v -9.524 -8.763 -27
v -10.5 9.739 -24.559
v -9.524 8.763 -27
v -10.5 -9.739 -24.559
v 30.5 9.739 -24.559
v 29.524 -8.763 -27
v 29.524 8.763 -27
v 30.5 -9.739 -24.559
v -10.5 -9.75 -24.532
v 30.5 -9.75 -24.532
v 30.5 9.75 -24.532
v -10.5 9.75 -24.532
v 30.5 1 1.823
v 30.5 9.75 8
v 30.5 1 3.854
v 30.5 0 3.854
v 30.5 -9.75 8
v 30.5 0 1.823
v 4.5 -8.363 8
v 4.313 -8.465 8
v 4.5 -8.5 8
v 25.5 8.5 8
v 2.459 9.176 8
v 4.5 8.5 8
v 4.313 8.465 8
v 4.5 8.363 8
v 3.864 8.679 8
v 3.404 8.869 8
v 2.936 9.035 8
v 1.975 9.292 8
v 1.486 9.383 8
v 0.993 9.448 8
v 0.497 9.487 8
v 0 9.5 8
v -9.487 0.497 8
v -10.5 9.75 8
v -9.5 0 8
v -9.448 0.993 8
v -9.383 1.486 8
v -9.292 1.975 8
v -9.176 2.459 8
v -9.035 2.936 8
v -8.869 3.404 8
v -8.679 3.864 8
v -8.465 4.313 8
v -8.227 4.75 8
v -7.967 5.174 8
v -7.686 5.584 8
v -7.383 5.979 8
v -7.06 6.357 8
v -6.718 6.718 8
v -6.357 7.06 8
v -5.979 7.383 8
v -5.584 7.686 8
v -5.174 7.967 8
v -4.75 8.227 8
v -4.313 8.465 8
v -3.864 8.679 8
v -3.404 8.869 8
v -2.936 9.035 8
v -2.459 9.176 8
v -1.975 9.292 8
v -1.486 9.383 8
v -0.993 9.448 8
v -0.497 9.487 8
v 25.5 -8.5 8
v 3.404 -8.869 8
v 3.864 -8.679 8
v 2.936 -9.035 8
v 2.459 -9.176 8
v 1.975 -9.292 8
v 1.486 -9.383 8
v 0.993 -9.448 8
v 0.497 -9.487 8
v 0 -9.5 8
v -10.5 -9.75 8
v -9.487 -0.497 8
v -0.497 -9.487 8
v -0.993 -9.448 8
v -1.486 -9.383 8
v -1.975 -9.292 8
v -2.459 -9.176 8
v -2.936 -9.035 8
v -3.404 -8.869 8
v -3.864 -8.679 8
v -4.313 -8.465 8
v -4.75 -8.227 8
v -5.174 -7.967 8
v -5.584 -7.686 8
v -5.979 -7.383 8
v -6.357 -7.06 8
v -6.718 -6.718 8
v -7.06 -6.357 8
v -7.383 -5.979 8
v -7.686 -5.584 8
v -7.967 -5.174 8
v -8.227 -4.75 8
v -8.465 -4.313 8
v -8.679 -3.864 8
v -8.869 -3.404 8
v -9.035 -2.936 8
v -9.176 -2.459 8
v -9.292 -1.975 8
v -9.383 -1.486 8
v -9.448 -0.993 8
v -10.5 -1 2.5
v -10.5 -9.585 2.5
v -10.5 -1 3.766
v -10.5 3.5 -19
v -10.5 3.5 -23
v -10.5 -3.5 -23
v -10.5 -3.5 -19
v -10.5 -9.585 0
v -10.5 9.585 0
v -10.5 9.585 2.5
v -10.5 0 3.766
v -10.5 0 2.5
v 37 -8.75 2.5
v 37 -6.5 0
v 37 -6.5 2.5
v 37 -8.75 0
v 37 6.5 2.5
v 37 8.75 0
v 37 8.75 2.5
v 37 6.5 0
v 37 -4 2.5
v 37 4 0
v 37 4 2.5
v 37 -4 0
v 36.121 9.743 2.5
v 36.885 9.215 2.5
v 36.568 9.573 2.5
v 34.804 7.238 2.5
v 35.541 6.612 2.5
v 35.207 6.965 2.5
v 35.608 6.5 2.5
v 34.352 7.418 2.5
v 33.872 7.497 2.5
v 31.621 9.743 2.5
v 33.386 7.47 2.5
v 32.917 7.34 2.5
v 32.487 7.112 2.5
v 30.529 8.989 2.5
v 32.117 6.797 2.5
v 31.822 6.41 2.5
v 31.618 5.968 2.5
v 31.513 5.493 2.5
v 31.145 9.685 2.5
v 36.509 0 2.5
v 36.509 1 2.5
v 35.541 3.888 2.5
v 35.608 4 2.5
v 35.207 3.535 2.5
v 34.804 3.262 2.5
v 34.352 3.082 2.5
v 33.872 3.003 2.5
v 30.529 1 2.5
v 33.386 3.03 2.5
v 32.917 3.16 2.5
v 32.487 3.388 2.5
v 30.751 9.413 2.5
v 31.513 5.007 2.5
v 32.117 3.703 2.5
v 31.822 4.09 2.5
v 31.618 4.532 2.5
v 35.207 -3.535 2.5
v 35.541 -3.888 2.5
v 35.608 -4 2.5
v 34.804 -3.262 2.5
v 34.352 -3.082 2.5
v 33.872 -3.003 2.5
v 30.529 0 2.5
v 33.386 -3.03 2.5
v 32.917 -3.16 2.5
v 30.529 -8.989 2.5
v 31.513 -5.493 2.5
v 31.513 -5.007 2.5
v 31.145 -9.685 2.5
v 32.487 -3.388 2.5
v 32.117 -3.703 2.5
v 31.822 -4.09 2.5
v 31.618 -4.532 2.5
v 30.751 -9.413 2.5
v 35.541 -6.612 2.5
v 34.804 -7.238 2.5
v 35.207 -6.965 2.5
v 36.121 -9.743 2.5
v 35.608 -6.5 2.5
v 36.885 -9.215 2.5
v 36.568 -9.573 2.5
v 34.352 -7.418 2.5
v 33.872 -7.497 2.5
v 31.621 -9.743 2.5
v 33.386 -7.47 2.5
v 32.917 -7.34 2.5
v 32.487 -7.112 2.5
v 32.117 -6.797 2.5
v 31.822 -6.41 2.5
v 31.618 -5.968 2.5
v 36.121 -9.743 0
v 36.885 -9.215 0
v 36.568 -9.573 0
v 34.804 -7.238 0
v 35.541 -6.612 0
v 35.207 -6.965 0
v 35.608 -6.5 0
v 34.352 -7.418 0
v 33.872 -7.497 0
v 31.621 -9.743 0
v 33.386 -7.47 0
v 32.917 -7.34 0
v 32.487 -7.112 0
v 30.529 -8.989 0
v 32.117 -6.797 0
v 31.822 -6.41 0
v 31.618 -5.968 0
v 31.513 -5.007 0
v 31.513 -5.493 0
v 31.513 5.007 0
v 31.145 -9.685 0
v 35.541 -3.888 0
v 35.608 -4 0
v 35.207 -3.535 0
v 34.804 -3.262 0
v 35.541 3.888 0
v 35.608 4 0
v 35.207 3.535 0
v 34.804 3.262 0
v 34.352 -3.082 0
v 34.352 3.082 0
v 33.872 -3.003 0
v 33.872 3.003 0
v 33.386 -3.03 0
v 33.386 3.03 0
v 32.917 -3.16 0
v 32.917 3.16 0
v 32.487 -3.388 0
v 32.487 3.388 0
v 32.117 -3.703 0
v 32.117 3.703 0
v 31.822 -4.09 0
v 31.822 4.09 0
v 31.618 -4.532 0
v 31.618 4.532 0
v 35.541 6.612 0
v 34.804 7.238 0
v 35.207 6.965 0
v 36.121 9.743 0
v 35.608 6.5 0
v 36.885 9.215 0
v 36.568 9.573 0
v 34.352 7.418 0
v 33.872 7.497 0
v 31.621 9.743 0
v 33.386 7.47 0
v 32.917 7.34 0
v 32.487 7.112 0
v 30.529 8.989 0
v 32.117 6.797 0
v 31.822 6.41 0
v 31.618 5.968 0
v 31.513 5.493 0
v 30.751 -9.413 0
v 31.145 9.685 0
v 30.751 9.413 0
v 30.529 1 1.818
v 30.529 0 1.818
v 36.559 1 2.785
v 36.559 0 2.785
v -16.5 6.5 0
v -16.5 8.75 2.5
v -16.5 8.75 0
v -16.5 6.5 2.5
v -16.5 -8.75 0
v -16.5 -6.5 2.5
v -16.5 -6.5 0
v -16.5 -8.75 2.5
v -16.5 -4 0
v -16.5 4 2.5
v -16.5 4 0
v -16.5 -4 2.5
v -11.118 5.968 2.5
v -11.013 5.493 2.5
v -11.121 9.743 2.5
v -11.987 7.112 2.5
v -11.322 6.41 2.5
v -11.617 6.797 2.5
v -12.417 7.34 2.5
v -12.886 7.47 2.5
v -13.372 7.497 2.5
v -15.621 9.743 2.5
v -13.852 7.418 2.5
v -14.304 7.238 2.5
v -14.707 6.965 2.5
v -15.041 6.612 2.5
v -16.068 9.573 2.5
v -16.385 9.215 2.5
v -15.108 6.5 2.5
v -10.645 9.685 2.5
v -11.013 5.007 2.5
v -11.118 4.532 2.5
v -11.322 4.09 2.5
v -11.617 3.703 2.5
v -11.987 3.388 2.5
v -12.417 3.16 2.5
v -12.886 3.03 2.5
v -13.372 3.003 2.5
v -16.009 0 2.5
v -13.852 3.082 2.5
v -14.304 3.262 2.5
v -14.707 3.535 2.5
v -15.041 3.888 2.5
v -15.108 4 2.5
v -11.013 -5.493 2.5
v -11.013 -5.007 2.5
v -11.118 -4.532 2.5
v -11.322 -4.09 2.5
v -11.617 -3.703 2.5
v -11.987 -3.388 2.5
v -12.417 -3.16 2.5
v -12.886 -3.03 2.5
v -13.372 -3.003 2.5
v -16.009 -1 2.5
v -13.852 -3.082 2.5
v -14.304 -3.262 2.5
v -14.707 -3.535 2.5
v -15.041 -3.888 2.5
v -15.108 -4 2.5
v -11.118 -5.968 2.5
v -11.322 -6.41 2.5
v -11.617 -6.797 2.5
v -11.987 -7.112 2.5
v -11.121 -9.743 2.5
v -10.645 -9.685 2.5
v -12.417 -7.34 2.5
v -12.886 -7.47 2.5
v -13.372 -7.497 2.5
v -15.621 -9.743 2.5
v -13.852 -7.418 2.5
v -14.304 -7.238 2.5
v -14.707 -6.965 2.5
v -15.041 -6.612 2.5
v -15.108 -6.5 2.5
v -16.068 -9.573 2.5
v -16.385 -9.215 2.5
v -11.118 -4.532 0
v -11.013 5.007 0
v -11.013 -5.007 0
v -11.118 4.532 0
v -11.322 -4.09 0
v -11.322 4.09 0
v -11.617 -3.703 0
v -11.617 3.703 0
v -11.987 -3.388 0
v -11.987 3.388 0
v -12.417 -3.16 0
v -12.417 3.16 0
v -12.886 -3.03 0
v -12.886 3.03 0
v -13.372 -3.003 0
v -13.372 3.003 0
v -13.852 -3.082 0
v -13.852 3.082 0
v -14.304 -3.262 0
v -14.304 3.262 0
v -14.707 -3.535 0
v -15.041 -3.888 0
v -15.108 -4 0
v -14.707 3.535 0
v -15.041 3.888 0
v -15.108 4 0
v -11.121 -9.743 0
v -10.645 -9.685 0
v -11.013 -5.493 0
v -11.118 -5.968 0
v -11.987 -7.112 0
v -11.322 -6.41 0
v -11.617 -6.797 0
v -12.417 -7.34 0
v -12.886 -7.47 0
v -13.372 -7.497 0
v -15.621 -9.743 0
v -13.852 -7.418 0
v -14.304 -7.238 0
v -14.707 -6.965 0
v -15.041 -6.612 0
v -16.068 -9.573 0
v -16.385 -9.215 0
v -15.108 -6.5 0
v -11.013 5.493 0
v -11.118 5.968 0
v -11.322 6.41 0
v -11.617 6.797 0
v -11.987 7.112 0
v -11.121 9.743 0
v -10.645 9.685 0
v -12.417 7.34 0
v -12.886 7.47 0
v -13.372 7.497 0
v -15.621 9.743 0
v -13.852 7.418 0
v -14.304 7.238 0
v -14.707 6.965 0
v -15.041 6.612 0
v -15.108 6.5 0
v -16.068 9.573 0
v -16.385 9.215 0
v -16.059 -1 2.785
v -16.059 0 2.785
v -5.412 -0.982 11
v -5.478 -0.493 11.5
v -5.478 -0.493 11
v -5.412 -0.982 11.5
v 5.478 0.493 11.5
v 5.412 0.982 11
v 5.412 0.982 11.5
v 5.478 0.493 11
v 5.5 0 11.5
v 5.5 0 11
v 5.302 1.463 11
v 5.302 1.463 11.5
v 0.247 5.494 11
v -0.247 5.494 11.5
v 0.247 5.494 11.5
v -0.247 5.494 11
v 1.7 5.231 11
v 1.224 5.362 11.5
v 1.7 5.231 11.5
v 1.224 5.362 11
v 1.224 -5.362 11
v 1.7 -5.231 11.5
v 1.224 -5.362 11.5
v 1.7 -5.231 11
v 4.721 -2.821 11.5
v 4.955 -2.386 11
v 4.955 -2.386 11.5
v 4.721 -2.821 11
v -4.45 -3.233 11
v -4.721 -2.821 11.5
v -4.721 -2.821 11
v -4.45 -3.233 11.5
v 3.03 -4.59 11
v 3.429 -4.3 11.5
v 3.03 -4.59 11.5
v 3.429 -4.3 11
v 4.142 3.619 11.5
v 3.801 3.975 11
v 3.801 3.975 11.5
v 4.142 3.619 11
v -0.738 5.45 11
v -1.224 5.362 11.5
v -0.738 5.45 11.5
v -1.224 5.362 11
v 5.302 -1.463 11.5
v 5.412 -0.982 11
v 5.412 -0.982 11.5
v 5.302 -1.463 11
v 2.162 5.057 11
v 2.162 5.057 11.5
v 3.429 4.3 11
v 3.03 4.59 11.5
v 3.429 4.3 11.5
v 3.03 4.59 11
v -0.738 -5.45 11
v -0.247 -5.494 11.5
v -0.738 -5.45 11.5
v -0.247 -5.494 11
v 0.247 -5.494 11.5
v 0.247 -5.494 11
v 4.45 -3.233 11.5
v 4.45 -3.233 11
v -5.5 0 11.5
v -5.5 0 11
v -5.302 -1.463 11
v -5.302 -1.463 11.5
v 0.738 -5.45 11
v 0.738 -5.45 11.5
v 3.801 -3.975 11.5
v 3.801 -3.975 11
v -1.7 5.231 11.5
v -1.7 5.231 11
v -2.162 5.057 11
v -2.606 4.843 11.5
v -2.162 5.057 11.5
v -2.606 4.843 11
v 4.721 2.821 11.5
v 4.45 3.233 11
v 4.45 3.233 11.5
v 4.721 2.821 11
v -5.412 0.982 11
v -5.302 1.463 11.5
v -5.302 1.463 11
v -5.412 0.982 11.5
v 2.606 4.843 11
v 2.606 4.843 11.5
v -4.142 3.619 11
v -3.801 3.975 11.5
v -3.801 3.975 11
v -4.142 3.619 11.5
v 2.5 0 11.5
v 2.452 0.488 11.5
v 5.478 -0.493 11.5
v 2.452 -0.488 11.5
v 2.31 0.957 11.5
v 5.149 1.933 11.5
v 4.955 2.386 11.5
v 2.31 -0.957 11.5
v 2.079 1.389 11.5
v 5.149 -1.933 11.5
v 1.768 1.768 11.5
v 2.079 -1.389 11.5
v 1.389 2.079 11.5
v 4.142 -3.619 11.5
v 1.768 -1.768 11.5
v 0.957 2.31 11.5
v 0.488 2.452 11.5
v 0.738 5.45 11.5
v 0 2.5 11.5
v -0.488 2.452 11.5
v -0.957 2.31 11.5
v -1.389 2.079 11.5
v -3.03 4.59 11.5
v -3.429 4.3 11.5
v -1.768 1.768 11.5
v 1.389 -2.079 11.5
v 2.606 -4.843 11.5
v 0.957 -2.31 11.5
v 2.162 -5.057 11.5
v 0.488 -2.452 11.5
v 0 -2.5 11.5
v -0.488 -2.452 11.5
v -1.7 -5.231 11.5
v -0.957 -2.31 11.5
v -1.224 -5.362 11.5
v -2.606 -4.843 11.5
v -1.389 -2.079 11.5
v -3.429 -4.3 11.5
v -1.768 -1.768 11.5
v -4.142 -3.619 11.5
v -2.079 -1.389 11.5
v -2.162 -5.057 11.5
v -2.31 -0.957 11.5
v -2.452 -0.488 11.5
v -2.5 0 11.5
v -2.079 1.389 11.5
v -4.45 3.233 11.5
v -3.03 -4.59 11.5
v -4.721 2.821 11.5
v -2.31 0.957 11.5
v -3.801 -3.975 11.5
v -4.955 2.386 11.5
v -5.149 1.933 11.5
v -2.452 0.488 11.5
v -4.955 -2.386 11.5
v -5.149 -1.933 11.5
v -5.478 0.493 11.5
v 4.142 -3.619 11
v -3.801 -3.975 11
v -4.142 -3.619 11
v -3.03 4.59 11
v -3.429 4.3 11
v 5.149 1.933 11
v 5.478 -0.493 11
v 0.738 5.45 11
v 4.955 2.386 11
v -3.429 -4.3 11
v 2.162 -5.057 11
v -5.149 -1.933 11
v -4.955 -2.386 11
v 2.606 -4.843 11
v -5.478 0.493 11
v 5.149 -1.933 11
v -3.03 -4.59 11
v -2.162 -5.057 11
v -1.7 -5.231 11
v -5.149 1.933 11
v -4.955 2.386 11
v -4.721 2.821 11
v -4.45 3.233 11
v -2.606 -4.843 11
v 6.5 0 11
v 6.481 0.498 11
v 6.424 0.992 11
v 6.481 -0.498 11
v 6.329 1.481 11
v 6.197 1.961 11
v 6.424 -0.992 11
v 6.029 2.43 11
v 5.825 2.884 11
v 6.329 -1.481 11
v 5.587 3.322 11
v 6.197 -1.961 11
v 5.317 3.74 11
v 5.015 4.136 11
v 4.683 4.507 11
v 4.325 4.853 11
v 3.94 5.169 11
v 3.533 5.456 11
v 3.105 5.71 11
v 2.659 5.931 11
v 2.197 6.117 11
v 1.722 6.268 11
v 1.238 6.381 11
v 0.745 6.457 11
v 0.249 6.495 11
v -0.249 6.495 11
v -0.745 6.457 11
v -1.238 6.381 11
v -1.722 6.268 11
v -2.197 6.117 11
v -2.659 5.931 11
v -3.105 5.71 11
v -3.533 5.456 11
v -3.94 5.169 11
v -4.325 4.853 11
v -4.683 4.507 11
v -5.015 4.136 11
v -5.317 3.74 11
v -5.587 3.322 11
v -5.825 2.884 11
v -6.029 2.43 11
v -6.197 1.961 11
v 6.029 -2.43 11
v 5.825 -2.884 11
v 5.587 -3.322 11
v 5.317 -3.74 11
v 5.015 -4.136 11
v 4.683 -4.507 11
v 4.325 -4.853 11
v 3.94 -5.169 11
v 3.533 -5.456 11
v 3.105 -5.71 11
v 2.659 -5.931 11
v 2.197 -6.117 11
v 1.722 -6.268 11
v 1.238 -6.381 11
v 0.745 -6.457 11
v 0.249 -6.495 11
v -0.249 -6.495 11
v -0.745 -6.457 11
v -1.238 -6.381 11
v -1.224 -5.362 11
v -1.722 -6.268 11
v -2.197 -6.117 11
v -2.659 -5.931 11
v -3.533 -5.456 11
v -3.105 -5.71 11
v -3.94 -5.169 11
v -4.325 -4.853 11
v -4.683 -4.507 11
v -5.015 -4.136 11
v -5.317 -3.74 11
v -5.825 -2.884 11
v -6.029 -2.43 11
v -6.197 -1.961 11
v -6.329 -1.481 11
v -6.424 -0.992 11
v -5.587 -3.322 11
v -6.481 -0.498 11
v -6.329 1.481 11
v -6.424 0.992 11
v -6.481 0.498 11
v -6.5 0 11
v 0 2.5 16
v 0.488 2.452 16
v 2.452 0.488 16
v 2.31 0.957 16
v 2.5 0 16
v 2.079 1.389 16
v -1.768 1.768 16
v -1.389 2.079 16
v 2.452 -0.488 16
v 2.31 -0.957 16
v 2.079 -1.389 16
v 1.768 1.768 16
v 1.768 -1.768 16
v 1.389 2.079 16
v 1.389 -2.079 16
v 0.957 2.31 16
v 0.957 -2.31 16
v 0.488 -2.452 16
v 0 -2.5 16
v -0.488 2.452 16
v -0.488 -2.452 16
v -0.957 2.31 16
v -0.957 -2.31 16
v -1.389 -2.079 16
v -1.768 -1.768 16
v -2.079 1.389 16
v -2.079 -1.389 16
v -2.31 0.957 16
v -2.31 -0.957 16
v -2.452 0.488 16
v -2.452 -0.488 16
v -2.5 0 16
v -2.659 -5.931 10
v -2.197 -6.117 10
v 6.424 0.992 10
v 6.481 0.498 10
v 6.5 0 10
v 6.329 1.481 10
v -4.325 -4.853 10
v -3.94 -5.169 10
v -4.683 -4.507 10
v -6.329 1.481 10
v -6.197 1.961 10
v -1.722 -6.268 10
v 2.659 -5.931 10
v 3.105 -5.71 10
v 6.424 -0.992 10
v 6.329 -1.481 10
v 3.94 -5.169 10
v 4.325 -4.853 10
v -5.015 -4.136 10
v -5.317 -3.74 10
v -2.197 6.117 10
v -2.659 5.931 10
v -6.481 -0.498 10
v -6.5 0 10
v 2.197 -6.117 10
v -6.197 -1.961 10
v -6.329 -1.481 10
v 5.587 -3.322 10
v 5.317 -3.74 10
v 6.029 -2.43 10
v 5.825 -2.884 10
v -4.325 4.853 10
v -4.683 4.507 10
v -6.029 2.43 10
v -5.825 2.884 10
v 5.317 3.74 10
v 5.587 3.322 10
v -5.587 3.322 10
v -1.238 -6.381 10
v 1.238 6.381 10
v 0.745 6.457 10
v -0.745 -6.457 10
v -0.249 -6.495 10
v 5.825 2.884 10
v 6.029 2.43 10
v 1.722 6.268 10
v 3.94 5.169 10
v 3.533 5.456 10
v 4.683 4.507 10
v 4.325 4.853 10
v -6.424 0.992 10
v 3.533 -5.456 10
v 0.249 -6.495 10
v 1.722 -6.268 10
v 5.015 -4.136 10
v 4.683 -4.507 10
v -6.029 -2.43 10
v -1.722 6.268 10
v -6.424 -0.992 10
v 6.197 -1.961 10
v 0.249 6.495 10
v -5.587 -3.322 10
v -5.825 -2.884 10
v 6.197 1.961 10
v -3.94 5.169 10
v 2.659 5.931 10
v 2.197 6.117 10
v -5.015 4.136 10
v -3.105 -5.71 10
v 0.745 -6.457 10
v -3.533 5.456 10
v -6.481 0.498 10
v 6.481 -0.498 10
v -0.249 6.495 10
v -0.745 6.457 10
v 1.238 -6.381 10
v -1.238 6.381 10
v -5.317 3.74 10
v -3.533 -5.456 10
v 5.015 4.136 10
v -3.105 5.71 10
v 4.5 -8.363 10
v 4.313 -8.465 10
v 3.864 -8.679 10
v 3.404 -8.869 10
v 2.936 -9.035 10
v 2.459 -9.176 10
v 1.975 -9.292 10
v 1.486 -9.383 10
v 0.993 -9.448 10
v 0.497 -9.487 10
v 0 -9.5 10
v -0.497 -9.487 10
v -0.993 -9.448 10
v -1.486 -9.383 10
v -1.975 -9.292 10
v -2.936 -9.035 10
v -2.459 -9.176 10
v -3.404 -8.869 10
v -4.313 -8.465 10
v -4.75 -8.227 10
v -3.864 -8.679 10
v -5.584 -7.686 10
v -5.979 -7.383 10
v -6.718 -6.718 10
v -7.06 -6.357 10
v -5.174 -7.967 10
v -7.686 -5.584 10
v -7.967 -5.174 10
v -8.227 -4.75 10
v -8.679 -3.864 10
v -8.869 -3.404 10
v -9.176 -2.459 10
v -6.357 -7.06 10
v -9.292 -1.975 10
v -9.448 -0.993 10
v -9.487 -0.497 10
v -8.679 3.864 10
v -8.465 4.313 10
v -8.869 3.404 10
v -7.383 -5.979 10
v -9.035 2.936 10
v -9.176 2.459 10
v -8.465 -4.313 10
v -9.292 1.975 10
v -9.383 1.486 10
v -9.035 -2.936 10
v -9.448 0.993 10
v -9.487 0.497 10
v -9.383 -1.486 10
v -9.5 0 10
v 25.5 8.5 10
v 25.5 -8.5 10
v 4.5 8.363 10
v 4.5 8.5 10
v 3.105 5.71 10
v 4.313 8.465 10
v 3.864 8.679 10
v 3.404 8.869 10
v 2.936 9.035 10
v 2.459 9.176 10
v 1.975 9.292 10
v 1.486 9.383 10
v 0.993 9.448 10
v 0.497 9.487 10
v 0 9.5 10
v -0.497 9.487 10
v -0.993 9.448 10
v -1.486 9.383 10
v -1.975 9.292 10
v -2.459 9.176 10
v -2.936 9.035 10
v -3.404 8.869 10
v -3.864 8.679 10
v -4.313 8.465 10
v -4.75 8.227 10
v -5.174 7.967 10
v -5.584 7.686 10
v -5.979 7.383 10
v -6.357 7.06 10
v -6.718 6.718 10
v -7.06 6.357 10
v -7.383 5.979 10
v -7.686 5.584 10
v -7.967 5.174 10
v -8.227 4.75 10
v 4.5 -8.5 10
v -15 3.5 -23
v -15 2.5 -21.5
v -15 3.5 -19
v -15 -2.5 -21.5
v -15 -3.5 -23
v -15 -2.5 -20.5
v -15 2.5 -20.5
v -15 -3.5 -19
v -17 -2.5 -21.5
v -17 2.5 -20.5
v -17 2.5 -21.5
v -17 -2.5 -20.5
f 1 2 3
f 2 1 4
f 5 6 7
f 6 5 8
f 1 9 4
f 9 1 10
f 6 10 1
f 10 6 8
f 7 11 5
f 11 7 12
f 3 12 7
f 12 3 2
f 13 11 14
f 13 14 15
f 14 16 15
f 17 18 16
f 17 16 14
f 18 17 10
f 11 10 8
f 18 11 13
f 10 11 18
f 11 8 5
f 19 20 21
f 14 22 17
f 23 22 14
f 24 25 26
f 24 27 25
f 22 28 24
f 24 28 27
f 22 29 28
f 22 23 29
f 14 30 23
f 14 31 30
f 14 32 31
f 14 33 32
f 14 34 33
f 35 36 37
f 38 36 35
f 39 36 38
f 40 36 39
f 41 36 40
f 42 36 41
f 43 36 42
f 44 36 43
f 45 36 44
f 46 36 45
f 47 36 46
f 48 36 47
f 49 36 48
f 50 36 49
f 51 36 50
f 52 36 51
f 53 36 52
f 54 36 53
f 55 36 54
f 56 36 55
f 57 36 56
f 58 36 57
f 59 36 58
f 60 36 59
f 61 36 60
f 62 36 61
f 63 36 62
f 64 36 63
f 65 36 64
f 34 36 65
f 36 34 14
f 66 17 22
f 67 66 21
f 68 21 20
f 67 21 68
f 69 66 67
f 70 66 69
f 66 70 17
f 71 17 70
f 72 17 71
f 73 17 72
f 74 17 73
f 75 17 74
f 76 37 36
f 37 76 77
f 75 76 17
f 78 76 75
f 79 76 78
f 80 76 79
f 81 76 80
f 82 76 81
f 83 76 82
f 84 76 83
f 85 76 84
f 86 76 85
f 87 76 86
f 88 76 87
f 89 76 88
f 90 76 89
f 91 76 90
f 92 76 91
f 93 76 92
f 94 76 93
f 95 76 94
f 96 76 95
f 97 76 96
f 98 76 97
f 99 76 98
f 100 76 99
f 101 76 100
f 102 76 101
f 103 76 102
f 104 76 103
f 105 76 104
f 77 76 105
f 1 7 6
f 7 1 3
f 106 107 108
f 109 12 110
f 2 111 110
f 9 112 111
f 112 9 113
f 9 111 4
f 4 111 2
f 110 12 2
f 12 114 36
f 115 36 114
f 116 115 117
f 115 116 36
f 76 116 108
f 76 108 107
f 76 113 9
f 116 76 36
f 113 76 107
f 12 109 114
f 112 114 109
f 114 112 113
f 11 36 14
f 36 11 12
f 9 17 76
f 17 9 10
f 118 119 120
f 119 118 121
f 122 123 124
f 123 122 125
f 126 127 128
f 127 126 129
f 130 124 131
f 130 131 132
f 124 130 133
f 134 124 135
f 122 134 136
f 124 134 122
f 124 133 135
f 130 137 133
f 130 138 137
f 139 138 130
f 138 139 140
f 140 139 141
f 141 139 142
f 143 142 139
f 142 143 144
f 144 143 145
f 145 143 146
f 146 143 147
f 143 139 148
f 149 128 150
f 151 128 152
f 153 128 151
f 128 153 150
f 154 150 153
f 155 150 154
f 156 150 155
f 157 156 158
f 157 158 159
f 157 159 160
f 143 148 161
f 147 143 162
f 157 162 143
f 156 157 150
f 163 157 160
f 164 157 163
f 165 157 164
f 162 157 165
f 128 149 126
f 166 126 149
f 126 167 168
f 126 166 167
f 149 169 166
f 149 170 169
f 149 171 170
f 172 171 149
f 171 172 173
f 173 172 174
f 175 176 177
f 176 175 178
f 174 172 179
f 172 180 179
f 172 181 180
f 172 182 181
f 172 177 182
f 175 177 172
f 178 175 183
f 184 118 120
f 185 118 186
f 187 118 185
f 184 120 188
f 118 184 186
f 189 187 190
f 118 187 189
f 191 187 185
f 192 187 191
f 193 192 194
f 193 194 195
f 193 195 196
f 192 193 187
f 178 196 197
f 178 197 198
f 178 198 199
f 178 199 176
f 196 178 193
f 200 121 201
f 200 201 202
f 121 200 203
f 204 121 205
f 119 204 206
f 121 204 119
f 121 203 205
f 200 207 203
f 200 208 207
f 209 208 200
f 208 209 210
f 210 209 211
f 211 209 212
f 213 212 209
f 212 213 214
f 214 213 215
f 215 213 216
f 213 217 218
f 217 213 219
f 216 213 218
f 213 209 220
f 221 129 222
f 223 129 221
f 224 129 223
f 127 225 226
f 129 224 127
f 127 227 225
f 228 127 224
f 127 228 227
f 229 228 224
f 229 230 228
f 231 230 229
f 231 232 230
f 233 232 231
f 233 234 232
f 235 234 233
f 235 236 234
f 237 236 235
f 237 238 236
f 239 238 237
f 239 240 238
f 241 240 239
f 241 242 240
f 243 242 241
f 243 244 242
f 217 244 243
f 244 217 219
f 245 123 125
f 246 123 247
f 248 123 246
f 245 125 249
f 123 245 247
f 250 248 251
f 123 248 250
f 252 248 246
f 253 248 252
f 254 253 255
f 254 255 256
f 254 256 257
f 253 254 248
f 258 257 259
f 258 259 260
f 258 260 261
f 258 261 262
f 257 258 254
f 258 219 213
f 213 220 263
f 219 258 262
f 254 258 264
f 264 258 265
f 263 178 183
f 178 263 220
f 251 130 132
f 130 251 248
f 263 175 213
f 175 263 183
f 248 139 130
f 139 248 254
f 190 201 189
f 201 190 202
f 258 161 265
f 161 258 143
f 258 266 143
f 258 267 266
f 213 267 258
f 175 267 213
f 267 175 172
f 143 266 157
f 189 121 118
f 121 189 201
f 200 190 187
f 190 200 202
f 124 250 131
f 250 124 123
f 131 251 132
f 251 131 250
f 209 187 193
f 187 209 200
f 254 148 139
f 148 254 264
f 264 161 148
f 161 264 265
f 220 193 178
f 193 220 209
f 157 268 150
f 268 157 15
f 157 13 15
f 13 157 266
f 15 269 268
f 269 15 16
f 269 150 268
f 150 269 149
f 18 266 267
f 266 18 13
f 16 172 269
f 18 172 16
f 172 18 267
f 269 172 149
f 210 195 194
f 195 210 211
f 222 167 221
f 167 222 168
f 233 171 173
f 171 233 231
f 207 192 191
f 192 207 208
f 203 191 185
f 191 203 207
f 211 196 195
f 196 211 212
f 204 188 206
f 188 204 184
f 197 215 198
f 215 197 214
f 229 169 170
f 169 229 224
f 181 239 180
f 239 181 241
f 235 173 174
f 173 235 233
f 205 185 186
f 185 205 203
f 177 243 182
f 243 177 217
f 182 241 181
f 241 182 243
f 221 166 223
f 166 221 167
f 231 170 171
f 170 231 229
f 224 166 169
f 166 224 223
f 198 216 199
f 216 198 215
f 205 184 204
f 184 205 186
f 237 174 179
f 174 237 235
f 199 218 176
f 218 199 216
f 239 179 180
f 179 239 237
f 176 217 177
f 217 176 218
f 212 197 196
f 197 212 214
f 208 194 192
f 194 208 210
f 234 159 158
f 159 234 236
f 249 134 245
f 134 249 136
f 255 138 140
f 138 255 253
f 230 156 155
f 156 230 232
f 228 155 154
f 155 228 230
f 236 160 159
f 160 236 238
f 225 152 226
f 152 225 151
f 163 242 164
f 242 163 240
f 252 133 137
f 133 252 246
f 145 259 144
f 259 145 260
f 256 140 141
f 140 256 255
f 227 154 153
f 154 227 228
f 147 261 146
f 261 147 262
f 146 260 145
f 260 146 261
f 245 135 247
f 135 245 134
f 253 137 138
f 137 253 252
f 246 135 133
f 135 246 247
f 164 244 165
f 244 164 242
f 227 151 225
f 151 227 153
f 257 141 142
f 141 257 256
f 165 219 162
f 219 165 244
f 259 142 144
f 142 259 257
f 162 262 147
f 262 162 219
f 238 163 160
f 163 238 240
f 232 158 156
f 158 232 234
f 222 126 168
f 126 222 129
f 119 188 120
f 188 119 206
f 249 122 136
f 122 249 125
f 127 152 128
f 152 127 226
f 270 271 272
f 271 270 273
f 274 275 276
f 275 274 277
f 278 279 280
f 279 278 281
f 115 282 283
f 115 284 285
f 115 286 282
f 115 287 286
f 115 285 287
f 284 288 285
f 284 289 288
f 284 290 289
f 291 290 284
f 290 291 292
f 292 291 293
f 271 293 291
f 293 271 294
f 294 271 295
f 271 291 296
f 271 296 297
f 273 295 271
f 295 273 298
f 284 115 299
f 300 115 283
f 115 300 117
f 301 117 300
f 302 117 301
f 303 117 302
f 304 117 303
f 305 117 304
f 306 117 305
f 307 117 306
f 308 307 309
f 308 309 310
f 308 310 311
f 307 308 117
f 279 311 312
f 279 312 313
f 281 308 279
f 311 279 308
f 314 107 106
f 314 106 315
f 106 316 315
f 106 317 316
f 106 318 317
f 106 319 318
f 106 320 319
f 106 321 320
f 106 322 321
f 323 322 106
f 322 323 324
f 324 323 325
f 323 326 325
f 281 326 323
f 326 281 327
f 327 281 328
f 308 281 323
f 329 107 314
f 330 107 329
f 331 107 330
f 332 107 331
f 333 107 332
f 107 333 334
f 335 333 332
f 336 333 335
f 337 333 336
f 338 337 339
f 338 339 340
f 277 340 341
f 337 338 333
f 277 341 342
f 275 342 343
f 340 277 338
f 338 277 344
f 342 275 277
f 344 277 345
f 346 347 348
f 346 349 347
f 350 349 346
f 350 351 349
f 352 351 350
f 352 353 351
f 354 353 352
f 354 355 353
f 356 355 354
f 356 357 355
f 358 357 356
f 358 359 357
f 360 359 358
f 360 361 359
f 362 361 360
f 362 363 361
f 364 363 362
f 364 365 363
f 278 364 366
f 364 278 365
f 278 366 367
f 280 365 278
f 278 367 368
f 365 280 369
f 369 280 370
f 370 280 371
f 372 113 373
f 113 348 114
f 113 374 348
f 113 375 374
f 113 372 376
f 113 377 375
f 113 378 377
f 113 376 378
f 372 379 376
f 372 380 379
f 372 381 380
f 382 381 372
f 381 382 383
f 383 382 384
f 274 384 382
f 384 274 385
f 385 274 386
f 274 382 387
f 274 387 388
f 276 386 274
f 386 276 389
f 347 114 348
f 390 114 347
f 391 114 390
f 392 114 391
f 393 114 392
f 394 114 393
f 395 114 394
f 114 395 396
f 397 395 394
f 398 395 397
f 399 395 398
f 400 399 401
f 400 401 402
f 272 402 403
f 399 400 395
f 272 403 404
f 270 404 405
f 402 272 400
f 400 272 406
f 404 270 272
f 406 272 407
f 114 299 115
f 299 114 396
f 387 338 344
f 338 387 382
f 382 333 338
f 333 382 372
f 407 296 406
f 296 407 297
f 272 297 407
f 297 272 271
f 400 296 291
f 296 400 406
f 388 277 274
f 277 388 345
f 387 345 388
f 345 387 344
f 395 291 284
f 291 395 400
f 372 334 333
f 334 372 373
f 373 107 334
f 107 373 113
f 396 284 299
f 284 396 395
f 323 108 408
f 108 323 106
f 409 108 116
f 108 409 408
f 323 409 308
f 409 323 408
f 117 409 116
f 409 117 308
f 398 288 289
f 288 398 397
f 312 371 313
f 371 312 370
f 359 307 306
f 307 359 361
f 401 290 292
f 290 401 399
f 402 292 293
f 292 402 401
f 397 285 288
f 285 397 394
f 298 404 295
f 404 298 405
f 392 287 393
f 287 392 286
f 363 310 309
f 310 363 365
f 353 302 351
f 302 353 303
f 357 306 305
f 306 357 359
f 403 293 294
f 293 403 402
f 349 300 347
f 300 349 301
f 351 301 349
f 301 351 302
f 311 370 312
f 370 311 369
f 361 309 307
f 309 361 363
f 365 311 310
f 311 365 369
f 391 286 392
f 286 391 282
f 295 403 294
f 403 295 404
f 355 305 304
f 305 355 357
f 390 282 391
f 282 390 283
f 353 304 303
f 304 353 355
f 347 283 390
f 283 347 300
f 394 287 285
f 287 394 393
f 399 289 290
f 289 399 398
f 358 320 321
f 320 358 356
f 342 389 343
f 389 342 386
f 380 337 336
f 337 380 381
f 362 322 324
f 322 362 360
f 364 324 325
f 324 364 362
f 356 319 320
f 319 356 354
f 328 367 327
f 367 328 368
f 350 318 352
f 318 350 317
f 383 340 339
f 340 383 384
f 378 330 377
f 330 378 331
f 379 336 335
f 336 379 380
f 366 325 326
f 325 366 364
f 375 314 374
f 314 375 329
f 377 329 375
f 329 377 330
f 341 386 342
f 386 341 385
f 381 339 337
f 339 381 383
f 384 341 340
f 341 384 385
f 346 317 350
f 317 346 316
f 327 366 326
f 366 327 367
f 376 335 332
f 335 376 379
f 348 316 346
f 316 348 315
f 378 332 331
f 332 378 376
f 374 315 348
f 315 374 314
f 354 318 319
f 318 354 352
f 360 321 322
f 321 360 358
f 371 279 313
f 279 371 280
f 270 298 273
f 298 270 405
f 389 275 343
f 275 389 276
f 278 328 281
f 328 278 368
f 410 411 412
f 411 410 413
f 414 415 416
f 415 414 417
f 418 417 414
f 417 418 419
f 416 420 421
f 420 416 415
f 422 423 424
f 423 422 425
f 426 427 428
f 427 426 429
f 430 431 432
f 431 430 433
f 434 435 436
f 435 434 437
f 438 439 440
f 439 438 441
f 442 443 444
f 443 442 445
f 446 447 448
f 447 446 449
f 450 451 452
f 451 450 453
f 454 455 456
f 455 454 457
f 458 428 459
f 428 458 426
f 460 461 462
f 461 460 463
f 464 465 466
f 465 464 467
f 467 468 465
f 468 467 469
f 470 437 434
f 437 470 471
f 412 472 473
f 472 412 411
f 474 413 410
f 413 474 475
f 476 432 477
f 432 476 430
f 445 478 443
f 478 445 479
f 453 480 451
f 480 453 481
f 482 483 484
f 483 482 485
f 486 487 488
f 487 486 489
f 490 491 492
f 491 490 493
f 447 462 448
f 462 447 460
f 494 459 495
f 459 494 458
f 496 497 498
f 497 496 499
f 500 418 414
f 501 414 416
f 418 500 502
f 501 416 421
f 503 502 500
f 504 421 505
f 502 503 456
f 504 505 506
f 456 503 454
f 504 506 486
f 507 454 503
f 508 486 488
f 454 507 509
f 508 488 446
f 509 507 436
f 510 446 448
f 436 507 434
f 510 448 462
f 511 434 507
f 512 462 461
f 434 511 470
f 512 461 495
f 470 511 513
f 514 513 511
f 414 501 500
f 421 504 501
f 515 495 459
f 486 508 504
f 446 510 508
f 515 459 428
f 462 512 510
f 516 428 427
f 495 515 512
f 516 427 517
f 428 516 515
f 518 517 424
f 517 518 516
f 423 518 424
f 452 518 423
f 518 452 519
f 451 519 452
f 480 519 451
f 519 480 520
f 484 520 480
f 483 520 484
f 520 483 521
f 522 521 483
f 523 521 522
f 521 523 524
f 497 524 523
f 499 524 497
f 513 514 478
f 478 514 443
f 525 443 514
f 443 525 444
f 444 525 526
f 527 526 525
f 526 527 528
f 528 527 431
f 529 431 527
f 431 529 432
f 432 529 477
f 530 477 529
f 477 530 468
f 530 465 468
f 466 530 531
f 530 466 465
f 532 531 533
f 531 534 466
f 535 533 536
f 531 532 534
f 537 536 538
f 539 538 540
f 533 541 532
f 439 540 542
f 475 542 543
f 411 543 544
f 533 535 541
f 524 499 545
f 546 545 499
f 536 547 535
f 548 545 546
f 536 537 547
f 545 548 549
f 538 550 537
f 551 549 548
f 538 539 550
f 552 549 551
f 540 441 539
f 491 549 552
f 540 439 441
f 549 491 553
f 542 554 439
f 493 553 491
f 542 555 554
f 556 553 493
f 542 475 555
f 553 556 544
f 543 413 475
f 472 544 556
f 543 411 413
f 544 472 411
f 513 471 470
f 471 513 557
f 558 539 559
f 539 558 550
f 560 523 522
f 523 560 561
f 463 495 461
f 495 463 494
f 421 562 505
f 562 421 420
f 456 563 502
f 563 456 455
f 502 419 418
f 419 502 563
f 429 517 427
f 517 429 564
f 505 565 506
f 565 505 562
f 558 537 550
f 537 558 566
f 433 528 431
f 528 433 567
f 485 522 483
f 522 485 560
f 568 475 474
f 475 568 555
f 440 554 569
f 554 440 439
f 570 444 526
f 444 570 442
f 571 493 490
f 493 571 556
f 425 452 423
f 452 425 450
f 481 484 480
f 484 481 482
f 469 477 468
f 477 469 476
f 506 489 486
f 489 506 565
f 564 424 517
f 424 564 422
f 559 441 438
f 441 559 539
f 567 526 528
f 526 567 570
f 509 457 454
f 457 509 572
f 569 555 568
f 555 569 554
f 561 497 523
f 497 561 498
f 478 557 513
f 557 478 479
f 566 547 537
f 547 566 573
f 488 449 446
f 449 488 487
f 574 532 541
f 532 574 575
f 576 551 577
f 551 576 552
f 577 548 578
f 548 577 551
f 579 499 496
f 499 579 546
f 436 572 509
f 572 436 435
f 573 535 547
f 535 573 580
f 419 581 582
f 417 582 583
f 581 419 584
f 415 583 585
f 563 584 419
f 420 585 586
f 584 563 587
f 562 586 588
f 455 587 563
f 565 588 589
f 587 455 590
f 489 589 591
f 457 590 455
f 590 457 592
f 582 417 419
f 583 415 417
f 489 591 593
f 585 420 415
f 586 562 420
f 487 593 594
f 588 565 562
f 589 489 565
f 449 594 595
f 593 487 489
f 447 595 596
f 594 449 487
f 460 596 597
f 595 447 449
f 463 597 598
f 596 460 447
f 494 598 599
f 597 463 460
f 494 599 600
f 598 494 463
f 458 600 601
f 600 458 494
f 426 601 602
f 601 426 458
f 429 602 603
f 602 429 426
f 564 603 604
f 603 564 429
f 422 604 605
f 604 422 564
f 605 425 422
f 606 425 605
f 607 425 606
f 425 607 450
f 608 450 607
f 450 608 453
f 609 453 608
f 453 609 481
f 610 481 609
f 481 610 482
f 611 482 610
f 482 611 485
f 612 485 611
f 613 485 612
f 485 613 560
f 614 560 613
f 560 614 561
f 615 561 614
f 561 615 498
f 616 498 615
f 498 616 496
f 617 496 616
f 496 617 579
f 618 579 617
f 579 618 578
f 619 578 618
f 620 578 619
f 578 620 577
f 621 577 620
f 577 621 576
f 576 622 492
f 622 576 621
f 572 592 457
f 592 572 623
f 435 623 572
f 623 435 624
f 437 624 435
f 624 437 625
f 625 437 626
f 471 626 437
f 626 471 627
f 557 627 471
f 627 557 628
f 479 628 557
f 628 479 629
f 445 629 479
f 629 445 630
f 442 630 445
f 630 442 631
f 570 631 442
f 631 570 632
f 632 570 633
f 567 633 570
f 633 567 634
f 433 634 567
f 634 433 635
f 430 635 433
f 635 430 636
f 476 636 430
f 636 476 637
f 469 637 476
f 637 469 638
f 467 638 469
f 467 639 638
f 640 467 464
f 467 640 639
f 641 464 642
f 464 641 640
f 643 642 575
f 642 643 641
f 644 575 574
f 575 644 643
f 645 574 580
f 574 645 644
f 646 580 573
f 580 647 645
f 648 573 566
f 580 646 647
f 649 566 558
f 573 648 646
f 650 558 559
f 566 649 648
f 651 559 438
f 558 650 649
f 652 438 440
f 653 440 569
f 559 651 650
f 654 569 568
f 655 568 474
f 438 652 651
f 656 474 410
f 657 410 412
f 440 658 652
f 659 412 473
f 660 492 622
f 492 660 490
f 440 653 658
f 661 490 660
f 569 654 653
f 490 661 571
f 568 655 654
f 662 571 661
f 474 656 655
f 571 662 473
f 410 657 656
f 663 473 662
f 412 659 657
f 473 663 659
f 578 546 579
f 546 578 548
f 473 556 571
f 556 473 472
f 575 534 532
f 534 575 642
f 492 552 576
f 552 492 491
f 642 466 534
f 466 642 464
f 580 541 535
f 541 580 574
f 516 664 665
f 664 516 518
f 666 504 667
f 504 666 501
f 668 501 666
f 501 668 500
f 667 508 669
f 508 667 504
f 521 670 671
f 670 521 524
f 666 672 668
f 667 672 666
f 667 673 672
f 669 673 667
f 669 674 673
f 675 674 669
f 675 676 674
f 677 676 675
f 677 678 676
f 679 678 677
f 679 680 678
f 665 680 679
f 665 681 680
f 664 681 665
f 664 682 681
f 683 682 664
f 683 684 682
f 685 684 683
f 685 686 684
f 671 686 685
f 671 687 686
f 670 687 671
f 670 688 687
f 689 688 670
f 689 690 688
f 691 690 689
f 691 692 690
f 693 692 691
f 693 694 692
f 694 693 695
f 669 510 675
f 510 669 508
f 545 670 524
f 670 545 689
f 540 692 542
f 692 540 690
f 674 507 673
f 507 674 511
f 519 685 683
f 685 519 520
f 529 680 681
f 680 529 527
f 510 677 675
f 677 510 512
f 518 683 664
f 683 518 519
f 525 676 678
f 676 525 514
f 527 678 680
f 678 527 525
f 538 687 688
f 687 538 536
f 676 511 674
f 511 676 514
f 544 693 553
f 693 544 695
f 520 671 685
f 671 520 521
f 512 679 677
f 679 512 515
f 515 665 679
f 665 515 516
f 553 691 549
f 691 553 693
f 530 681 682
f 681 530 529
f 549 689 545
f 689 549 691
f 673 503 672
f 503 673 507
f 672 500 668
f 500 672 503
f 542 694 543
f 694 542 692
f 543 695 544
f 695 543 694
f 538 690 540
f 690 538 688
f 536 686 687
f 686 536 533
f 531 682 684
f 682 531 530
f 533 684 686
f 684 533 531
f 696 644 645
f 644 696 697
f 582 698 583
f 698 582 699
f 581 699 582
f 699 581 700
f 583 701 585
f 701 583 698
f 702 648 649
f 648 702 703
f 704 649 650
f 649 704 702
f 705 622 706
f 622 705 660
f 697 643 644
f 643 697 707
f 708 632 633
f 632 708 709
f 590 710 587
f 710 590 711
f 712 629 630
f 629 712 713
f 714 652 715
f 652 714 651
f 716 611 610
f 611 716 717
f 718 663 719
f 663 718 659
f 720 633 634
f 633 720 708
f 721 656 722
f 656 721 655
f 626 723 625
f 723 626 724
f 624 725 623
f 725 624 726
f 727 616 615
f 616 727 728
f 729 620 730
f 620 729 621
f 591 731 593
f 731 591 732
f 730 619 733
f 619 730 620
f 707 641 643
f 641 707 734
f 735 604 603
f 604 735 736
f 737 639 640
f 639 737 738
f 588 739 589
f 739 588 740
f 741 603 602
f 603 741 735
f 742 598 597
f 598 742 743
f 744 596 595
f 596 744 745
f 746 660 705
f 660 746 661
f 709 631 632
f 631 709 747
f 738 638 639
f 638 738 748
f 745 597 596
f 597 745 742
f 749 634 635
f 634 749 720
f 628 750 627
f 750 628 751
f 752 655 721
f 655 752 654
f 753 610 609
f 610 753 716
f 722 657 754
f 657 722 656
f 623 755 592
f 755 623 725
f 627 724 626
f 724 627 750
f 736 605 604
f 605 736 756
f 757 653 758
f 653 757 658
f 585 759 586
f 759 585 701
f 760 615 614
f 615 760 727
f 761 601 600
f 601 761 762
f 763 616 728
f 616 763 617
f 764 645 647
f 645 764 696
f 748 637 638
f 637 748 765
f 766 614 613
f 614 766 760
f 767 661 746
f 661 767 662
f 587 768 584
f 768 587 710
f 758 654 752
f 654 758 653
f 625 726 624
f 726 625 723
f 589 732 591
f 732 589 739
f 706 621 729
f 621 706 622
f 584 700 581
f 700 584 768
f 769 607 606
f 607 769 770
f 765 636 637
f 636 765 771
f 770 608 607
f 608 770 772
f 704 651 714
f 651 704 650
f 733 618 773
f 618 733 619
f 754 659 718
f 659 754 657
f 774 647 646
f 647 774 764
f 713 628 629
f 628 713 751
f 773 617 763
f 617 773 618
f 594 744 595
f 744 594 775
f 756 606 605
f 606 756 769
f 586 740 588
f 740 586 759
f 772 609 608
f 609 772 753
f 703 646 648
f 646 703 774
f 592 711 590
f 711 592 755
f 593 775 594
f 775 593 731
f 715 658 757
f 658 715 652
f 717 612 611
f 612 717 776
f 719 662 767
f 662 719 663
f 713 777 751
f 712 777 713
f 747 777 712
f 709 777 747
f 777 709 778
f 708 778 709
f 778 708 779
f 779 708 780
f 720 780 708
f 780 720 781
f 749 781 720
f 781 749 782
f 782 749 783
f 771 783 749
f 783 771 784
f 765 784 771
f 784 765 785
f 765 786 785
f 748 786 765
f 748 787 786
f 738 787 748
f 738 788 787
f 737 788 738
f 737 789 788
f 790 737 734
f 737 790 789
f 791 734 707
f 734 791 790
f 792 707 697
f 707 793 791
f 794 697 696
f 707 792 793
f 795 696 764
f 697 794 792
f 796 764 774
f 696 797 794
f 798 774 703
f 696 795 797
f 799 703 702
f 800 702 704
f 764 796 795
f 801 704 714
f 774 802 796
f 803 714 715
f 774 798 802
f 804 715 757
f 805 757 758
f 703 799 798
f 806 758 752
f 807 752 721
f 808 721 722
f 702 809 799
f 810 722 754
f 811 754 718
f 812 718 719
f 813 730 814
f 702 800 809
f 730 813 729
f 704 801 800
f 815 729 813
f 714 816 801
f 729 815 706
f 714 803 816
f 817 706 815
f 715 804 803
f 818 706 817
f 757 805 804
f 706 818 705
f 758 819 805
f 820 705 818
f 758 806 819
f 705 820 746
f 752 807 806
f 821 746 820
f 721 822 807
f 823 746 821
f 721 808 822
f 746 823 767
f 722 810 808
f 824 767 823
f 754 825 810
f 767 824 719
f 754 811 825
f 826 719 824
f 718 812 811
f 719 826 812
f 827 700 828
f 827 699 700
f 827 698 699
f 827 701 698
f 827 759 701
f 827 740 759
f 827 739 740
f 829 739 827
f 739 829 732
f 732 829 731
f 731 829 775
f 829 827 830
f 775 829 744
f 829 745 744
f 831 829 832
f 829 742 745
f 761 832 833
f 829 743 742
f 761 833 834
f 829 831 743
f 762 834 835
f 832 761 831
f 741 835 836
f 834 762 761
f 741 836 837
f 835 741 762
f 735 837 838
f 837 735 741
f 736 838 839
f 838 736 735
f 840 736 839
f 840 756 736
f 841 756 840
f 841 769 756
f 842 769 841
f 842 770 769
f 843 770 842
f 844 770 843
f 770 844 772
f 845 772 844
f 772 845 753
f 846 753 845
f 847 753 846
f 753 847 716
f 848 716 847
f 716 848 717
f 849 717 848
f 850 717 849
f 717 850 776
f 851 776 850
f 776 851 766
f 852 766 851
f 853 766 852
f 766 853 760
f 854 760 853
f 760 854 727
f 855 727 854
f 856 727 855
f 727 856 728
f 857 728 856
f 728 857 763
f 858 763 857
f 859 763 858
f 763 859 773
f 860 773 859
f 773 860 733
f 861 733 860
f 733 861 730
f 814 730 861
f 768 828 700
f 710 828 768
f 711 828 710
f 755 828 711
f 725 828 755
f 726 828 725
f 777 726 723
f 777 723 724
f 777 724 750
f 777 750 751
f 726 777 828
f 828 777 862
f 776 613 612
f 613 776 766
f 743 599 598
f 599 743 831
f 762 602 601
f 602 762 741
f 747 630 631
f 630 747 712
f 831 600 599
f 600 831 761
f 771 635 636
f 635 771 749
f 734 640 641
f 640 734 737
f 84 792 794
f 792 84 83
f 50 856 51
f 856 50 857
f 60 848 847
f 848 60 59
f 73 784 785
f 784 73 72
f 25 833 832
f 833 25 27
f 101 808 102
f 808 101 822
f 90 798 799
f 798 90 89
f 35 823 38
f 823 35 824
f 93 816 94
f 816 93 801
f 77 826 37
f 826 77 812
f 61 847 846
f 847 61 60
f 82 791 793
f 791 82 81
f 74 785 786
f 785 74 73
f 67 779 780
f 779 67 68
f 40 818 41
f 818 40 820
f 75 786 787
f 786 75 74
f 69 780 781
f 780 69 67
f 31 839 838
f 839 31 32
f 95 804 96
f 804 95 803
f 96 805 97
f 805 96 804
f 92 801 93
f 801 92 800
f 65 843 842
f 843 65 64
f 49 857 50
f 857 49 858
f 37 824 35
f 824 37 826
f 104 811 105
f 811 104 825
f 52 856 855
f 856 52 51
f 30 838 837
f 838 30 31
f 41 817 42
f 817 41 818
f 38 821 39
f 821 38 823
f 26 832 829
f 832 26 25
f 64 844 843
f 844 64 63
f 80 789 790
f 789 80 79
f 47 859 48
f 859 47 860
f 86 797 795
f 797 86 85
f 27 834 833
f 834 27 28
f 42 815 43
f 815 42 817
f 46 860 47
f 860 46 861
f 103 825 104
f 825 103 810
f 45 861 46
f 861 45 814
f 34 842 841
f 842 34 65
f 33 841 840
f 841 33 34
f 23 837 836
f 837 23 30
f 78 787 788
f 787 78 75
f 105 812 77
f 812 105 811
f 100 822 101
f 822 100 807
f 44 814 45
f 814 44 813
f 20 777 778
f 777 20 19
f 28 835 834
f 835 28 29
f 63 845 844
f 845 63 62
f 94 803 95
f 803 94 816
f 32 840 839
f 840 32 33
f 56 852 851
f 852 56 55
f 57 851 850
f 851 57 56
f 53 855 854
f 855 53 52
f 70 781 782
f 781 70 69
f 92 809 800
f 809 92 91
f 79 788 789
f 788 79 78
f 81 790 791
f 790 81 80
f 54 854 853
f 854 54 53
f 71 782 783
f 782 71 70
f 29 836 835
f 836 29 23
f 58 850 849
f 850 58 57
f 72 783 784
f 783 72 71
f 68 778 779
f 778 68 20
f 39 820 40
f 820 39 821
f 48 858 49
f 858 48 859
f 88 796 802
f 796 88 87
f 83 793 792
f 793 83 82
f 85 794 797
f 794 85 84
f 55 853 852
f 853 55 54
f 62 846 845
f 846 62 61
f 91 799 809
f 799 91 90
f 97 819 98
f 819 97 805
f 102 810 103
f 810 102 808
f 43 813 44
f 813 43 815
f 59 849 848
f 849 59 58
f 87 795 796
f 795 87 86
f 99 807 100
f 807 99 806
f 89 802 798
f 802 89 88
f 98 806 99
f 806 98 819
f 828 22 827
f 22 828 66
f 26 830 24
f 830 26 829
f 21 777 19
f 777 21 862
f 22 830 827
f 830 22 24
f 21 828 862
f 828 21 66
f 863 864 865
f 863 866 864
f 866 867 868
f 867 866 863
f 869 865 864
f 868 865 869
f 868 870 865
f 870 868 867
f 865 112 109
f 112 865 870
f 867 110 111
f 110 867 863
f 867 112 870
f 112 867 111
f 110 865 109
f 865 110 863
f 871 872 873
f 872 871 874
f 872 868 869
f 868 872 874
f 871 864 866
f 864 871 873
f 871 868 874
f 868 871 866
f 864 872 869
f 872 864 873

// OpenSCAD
// file: ../../rounded_cube.scad
// Cube with rounded edges on all sides
// The first parameters defines the size of the cube (array)
// The second parameter defines the edges radius along each axis (array)
//
// Thanks to hagen from OpenSCAD mailing list for this optimize solution

//rcube(size=[25, 25, 10], radius=[1, 1, 5], center=true, $fn=32);


module _rsquare(size=[1, 1], radius=0) {
    assign(sx=size[0], sy=size[1], r=min(radius, size[0]/2, size[1]/2)) {
        if (r == 0) {
            square(size=[sx, sy], center=true);  // not rounded
        }
        else {
            hull() {
                for (corner=[[sx/2-r, sy/2-r], [-sx/2+r, sy/2-r], [sx/2-r, -sy/2+r], [-sx/2+r, -sy/2+r]]) {
                    translate(corner) {
                        circle(r=r);
                    }
                }
            }
        }
    }
}


module _rcube(size=[1, 1, 1], radius=[0, 0, 0]) {
    assign(sx=size[0], sy=size[1], sz=size[2], rx=radius[0], ry=radius[1], rz=radius[2]) {
        translate([sx/2, sy/2, sz/2]) {
            intersection() {
                rotate([90, 0, 0]) {
                    rotate([0, 90, 0]) {
                        linear_extrude(height=sx, center=true) {
                            _rsquare(size=[sy, sz], radius=rx);
                        }
                    }
                }
                rotate([90, 0, 0]) linear_extrude(height=sy, center=true) {
                    _rsquare(size=[sx, sz], radius=ry);
                }
                linear_extrude(height=sz, center=true) {
                    _rsquare(size=[sx, sy], radius=rz);
                }
            }
        }
    }
}


module rcube(size=[1, 1, 1], radius=[0, 0, 0], center=true) {
    if (!center) {
        _rcube(size=size, radius=radius);
    }
    else {
        assign(sx=size[0], sy=size[1], sz=size[2]) {
            translate([-sx/2, -sy/2, -sz/2]) {
                _rcube(size, radius=radius);
            }
        }
    }
}


//module rcube(size=[1, 1, 1], radius=[0, 0, 0], center=true) {
//    assign(sx=size[0], sy=size[1], sz=size[2], rx=radius[0], ry=radius[1], rz=radius[2]) {
//        intersection() {
//
//            // Radius on X axis
//            rotate([0, 90, 0])
//            linear_extrude(height=sx, center=center) {
//                minkowski() {
//                    square([sz-2*rx, sy-2*rx], center=center);
//                    scale([rx, rx]) circle(1);
//                }
//            }
//
//            // Radius on Y axis
//            rotate([90, 0, 0])
//            linear_extrude(height=sy, center=center) {
//                minkowski() {
//                    square([sx-2*ry, sz-2*ry], center=center);
//                    scale([ry, ry]) circle(1);
//                }
//            }
//
//            // Radius on Z axis
//            linear_extrude(height=sz, center=center) {
//                minkowski() {
//                    square([sx-2*rz, sy-2*rz], center=center);
//                    scale([rz, rz]) circle(1);
//                }
//            }
//        }
//    }
//}
// main file
// TowerPro MG-995/995R/996/996R servo mockup

use <../../rounded_cube.scad>

SERVO_L = 41.0;
SERVO_W = 19.5;
SERVO_H = 37-2;

CHAMFER_W = 1;
CHAMFER_H = 2.5;

SERVO_BRACKET_L = 6.5;
SERVO_BRACKET_W = SERVO_W;
SERVO_BRACKET_H = 2.5;
SERVO_BRACKET_Z_POS = 27;

$fs=0.5;
$fa=2.5;


module chamfer(w=1, h=1, l=10, center=true)
{
    rotate([90, 0, 0]) {
        linear_extrude(height=l, center=center) {
            polygon(points=[[0, 0], [w, 0], [0, h]]);
        }
    }
}


module MG995_bracket()
{
    difference() {
        union() {
            rcube([SERVO_BRACKET_L, SERVO_W, SERVO_BRACKET_H], [0, 0, 1], center=true);
            rotate([0, 10, 0]) {
                translate([-5.5, 0, 0]) {
                    cube([8, 1, 2]);
                }
            }
        }

        // screw holes
        union() {
            translate([0, -10.5/2, 0]) {
                cylinder(d=4.5, h=SERVO_BRACKET_H+1, center=true);
            }
            translate([0, 10.5/2, 0]) {
                cylinder(d=4.5, h=SERVO_BRACKET_H+1, center=true);
            }
            translate([SERVO_BRACKET_L/2, -10.5/2, 0]) {
                cube([4, 2.5, SERVO_BRACKET_H+1], center=true);
            }
            translate([SERVO_BRACKET_L/2, 10.5/2, 0]) {
                cube([4, 2.5, SERVO_BRACKET_H+1], center=true);
            }
        }
    }
}


module MG995_torque_mount()
{
    difference() {
        union() {
            translate([0, 0, 2.7]) cylinder(h=2, d=20);
            cylinder(h=4.7, d=9);
        }
        translate([0, 0, -1])cylinder(h=8, d=4.5);
        translate([7, 0, 2]) cylinder(h=4, d=3);
        rotate([0, 0, 90]) translate([7, 0, 2]) cylinder(h=4, d=3);
        rotate([0, 0, 180]) translate([7, 0, 2]) cylinder(h=4, d=3);
        rotate([0, 0, 270]) translate([7, 0, 2]) cylinder(h=4, d=3);
    }
}


module MG995_wire_terminal()
{
    translate([0, -7/2, 0]) {
        cube([5, 7, 4]);
    }
    translate([0, -5/2, (4-1)/2]) {
        cube([7, 5, 1]);
    }
}


module MG995()
{
    translate([0, 0, 0]) {
        
        // main part
        translate([20/2, 0, SERVO_H/2-SERVO_BRACKET_Z_POS]) {
            difference() {
                cube([SERVO_L, SERVO_W, SERVO_H], center=true);

                // chanfrein
                translate([0, 0, -SERVO_H/2-0.01])
                scale(1.001)
                intersection() {
                    translate([0, 0, CHAMFER_H/2]) {
                        cube([SERVO_L, SERVO_W, CHAMFER_H], center=true);
                    }
                    union() {
                        translate([-SERVO_L/2, 0, 0]) {
                            chamfer(w=CHAMFER_W, h=CHAMFER_H, l=SERVO_W, center=true);
                        }
                        translate([SERVO_L/2, 0, 0]) {
                            mirror([1, 0, 0]) {
                                chamfer(w=CHAMFER_W, h=CHAMFER_H, l=SERVO_W, center=true);
                            }
                        }
                        translate([0, -SERVO_W/2, 0]) {
                            rotate([0, 0, 90]) {
                                chamfer(w=CHAMFER_W, h=CHAMFER_H, l=SERVO_L, center=true);
                            }
                        }
                        translate([0, SERVO_W/2, 0]) {
                            rotate([0, 0, -90]) {
                                chamfer(w=CHAMFER_W, h=CHAMFER_H, l=SERVO_L, center=true);
                            }
                        }
                    }
                }
            }
        }
        
        translate([20/2+SERVO_L/2+SERVO_BRACKET_L/2, 0, SERVO_BRACKET_H/2]) {
            MG995_bracket();
        }
        translate([-20/2-SERVO_BRACKET_L/2, 0, SERVO_BRACKET_H/2]) {
            rotate([0, 0, 180]) {
                MG995_bracket();
            }
        }
        translate([0, 0, SERVO_H-SERVO_BRACKET_Z_POS]) {
            cylinder(d=19, h=2, center=false);
            translate([-21/2+15, -17/2, 0]) {
                cube([21, 17, 2], center=false);
            }
            translate([0, 0, 2]) {
                cylinder(d=13, h=1, center=false);
                translate([0, 0, 1]) {
                    cylinder(d=11, h=0.5, center=false);
                    translate([0, 0, 0.5]) {
                        cylinder(h=4.5, d=5);
                    }
                }
            }
        }

        *translate([0, 0, 14]) {
            MG995_torque_mount();
        }

        rotate([0, 0, 180]) {
            translate([10, 0, -SERVO_BRACKET_Z_POS+4]) {
                MG995_wire_terminal();
            }
        }
    }
}


color("gray") MG995();
